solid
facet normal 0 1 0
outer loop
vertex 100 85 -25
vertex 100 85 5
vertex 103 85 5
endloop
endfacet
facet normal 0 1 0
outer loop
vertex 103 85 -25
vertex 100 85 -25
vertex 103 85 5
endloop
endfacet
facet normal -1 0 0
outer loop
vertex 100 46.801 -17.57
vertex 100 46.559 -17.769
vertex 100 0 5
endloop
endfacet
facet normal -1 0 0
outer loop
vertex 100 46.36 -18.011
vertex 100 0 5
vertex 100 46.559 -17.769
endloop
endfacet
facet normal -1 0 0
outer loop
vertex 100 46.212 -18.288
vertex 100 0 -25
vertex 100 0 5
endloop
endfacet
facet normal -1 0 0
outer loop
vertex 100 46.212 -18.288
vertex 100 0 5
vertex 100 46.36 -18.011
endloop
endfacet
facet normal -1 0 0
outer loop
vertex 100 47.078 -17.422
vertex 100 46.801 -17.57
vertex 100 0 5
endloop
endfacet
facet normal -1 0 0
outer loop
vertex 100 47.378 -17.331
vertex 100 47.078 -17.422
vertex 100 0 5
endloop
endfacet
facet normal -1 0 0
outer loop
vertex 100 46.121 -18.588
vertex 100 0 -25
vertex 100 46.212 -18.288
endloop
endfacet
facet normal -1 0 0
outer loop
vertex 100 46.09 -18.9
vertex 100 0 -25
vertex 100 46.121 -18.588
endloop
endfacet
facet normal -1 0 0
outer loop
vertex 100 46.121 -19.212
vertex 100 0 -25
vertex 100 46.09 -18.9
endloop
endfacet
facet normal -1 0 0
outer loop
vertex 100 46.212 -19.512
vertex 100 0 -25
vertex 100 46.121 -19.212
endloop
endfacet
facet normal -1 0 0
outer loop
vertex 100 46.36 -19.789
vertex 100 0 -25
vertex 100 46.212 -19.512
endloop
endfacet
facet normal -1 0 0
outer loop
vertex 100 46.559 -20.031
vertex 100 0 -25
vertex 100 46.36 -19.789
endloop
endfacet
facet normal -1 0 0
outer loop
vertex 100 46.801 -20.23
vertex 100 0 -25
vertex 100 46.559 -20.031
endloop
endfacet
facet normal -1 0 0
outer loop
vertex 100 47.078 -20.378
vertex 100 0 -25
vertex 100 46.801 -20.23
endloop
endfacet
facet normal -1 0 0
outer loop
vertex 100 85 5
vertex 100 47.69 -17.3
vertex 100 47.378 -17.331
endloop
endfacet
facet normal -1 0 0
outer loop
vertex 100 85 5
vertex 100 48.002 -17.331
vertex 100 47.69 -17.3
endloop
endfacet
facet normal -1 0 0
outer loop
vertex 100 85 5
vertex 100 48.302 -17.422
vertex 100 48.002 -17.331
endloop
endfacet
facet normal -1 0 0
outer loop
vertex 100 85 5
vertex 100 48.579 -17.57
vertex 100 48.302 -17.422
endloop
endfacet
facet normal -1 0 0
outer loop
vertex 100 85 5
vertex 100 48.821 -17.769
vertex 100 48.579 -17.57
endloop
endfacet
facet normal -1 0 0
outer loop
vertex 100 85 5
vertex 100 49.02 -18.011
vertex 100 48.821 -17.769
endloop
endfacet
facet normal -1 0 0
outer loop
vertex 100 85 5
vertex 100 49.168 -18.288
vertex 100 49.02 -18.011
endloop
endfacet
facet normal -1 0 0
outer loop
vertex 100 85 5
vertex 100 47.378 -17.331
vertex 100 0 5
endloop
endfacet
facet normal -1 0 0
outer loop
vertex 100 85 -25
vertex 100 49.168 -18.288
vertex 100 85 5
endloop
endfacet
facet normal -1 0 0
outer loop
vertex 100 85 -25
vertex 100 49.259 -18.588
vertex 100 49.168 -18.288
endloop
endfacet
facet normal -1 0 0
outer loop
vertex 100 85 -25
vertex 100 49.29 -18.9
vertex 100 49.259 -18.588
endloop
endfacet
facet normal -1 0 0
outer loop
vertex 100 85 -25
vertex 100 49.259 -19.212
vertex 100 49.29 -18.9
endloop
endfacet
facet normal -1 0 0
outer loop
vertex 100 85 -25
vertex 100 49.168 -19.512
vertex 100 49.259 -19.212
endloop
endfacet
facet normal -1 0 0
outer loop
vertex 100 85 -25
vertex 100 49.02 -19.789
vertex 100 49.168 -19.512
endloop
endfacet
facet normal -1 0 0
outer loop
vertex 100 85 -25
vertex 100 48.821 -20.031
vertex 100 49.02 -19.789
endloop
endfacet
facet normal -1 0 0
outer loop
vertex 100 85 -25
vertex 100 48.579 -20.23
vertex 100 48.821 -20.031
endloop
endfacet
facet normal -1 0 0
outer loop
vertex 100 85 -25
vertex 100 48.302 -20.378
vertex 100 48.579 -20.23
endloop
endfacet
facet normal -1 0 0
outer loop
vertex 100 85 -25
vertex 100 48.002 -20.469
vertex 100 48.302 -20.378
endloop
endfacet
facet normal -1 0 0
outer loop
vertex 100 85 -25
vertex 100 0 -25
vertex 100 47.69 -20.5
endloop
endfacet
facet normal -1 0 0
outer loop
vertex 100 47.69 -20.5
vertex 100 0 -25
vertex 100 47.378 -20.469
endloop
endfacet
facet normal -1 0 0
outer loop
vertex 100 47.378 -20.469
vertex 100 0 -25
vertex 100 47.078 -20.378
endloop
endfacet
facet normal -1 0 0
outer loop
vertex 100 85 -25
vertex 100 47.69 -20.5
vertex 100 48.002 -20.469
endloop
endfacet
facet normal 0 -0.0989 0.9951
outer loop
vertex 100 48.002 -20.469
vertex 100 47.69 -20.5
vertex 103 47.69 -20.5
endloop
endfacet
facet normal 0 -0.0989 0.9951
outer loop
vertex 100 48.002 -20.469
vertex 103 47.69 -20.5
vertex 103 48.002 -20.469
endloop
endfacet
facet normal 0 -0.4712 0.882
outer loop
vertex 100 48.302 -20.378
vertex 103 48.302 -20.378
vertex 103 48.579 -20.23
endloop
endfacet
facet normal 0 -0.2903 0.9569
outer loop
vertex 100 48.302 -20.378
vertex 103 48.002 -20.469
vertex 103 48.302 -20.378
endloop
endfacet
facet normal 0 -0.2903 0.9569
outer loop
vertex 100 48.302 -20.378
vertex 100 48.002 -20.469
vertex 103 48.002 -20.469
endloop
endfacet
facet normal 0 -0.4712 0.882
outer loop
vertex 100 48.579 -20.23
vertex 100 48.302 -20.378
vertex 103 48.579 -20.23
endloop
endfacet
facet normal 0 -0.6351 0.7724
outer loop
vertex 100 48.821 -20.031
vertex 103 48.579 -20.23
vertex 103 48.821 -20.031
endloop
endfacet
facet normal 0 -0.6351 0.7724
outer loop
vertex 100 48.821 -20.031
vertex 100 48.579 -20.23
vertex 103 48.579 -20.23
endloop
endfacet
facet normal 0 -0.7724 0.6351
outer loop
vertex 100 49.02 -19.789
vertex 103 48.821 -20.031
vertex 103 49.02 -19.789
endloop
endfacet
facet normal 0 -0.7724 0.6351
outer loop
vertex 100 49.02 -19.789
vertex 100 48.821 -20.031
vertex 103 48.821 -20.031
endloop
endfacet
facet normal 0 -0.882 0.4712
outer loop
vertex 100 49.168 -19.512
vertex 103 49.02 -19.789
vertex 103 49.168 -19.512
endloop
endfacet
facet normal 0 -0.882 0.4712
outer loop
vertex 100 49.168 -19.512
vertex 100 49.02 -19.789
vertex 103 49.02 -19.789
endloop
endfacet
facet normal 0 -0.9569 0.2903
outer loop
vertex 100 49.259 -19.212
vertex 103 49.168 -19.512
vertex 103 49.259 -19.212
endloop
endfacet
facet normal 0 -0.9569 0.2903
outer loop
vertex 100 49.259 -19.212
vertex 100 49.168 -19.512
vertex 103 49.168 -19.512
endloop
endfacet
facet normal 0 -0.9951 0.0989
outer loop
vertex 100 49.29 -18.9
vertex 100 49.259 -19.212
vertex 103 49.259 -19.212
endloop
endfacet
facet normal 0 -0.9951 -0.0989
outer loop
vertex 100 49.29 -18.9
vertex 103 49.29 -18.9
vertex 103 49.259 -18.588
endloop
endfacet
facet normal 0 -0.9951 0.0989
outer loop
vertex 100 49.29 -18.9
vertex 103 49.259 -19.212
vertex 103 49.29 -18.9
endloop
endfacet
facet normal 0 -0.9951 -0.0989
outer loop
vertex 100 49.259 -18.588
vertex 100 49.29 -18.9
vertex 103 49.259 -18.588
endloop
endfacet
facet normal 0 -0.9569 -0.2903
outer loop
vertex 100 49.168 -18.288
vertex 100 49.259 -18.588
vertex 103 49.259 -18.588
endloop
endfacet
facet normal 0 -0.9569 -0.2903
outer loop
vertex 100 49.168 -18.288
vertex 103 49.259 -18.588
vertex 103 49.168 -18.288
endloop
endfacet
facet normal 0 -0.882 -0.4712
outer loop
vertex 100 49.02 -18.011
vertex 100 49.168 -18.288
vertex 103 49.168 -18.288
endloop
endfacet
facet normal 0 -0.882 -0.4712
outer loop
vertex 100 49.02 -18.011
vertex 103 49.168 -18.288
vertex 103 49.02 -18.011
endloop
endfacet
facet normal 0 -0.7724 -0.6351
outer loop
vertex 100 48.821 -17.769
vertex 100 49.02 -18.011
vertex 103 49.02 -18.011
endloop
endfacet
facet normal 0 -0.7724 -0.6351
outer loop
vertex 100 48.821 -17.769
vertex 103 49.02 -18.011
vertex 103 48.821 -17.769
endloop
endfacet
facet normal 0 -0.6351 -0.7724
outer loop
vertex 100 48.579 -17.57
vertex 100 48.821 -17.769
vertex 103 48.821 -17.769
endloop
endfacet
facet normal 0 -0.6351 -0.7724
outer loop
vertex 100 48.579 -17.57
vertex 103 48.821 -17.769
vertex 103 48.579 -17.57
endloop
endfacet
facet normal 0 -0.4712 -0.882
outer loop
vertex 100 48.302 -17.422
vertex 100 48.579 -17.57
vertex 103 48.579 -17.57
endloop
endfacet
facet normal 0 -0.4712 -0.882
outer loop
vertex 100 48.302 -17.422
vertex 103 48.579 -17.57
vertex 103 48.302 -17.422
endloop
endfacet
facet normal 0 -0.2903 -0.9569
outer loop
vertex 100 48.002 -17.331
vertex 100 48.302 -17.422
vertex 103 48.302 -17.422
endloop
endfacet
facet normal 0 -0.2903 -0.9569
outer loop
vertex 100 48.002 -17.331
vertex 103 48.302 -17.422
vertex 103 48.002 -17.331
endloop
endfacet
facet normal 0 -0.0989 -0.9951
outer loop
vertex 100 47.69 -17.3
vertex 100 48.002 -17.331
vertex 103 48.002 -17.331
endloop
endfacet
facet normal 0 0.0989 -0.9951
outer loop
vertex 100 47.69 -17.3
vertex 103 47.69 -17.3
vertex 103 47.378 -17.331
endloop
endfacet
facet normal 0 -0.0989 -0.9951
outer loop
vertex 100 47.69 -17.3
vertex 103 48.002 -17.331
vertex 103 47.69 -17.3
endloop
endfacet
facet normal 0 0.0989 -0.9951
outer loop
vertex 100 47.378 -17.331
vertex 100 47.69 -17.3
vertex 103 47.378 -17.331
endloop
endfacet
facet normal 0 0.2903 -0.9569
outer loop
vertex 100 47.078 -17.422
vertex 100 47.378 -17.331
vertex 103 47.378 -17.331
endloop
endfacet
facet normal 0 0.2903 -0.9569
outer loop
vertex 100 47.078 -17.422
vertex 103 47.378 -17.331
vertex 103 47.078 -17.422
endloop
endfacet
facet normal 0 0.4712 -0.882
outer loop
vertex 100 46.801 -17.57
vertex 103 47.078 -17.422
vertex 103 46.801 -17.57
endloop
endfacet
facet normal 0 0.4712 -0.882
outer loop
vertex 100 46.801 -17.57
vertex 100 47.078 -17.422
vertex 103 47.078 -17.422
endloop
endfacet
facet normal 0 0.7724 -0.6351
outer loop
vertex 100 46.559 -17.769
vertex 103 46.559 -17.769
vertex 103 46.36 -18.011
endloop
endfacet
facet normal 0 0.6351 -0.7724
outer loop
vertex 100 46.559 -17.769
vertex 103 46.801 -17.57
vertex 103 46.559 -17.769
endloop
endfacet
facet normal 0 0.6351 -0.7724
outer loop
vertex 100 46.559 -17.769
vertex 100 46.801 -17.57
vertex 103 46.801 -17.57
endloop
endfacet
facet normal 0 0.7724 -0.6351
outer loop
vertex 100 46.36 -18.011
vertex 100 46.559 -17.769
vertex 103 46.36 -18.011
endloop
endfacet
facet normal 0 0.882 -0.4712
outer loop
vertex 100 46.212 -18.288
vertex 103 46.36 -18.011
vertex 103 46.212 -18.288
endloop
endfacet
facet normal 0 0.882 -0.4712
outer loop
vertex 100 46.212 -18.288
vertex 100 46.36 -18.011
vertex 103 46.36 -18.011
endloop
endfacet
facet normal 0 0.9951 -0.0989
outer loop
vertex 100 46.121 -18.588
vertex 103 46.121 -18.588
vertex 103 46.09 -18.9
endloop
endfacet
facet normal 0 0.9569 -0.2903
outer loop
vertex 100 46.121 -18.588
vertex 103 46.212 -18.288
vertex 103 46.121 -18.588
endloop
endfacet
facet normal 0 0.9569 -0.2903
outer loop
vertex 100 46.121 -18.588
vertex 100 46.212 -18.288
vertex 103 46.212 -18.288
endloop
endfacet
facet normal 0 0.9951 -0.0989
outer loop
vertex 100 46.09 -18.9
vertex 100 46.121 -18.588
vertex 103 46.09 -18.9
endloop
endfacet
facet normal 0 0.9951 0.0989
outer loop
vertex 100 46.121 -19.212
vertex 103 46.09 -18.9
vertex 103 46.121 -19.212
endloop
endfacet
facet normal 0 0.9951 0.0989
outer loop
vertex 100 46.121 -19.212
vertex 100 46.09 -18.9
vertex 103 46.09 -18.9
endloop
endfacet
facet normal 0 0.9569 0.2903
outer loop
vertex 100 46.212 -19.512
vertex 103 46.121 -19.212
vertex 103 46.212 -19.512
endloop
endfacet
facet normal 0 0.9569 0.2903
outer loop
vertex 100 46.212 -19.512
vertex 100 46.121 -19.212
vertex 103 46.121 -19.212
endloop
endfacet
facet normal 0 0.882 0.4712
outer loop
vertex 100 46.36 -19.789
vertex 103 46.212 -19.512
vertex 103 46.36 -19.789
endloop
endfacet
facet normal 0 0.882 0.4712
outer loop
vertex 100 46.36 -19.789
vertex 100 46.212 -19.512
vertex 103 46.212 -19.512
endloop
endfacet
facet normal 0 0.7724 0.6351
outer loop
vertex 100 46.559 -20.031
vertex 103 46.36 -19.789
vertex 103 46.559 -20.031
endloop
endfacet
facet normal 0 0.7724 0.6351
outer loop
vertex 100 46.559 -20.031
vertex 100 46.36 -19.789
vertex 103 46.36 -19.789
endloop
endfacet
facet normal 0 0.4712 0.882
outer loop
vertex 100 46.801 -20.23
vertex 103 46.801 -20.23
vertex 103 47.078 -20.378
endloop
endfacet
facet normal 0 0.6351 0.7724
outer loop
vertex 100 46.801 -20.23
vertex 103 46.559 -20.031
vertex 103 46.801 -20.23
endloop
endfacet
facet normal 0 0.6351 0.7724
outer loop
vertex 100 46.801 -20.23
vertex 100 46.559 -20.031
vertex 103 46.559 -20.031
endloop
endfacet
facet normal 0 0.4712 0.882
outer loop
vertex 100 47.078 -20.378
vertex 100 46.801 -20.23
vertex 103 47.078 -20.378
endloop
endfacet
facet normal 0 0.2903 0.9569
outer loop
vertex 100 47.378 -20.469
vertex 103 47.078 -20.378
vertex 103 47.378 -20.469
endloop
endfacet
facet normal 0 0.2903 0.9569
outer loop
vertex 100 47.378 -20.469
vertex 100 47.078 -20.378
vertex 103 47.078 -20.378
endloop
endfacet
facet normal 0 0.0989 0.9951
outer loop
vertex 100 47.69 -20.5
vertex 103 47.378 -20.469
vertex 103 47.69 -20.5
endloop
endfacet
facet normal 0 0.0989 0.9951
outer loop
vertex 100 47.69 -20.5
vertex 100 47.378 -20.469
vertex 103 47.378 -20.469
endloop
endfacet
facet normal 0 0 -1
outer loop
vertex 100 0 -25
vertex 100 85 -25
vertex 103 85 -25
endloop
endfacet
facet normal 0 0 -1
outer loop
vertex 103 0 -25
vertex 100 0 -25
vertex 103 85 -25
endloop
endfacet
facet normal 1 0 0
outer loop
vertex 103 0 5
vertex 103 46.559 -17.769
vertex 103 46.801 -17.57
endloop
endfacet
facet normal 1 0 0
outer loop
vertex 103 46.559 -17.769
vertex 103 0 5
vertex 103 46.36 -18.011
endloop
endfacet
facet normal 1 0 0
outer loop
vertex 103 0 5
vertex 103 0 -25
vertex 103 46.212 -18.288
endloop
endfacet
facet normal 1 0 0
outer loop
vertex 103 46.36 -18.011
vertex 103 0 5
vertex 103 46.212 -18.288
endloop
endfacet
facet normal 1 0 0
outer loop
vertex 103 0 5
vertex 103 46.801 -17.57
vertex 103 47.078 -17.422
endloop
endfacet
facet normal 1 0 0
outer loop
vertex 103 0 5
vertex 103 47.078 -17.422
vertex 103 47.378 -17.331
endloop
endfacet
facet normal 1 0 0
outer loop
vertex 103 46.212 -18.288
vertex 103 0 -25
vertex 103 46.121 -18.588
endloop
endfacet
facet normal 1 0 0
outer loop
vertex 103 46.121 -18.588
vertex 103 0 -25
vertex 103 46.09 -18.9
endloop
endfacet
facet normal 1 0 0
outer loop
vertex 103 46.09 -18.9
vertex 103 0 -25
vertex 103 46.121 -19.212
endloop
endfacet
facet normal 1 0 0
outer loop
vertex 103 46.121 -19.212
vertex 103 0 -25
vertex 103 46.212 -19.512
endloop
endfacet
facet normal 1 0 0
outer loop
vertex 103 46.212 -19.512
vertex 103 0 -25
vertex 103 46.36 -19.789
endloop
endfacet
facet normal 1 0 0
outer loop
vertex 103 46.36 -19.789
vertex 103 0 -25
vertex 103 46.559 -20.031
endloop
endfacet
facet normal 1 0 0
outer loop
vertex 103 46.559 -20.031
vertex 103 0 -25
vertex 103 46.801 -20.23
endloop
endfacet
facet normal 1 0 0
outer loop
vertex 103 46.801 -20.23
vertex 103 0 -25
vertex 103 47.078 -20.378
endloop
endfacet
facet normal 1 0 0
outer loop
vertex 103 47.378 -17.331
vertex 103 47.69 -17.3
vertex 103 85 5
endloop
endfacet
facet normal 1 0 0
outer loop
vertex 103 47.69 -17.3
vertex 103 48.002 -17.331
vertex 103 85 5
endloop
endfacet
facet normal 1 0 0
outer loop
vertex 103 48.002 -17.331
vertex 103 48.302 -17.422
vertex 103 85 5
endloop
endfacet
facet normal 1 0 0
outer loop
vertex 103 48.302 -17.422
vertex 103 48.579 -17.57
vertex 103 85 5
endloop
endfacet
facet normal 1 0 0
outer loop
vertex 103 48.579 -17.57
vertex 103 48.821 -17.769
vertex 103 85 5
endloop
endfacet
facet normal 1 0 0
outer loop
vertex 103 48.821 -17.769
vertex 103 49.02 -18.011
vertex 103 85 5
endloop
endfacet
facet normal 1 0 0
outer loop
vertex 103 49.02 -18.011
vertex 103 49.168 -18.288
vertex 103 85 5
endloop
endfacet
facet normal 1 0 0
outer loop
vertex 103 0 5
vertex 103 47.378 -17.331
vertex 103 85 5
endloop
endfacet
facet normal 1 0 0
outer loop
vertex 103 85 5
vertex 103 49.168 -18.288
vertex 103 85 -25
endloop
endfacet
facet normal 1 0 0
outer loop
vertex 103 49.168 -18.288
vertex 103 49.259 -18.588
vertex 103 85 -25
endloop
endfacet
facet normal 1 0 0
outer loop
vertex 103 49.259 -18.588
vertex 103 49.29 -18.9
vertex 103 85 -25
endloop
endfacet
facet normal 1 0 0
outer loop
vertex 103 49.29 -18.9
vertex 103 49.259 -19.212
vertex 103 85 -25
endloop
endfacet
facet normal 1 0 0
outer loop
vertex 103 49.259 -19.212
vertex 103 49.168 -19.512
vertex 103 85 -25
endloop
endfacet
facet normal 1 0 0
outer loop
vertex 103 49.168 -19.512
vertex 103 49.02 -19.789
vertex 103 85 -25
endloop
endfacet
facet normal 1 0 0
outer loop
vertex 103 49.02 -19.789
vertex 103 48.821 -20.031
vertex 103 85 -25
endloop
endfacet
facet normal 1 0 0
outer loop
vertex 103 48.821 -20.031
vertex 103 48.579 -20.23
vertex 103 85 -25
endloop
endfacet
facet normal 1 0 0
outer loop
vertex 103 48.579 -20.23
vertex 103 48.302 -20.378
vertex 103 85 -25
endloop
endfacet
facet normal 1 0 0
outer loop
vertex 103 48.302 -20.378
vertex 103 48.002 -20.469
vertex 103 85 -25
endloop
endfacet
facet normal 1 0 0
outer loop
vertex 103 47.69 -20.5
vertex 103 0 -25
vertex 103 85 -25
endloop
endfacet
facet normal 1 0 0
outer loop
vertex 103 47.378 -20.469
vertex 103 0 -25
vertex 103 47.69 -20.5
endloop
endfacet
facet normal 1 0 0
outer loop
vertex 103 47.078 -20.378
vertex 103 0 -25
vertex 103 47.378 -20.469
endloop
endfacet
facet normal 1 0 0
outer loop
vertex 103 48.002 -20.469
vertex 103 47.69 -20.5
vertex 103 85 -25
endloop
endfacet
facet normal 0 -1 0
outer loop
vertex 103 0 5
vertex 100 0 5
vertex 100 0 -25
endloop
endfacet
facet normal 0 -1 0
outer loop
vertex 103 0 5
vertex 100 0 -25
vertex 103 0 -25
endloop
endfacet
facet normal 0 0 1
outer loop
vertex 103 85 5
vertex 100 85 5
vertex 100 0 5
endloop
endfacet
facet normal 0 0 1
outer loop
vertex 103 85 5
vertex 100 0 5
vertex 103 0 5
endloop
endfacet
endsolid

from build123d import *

# Parameters (mm, degrees)
CYLINDER028_R           = 1.6
CYLINDER028_DEPTH       = 10
CYLINDER028_PITCH_ANGLE = 90
BOX003_W                = 3
BOX003_H                = 85
BOX003_DEPTH            = 30


with BuildPart() as back_hole:
    # Cylinder028 → Cylinder028 (new body)
    with BuildSketch(Plane.XY):
        Circle(CYLINDER028_R)
    extrude(amount=CYLINDER028_DEPTH)


with BuildPart() as back_hole_1:
    # Cylinder028 pitch: moved
    add(back_hole.part.rotate(Axis((0, 0, 0), (0, 1, 0)), CYLINDER028_PITCH_ANGLE))


with BuildPart() as back_hole_2:
    # Cylinder028 placement: moved
    add(back_hole_1.part.moved(Location((97.6, 47.69, -18.9))))


with BuildPart() as final_back:
    # Box003 → Box003 (new body)
    with BuildSketch(Plane(origin=(100, 0, -25), x_dir=(1, 0, 0), z_dir=(0, 0, 1))):
        with Locations((1.5, 42.5)):
            Rectangle(BOX003_W, BOX003_H)
    extrude(amount=BOX003_DEPTH)

    # Cut025: cut back hole
    add(back_hole_2.part, mode=Mode.SUBTRACT)


solid = final_back.part
